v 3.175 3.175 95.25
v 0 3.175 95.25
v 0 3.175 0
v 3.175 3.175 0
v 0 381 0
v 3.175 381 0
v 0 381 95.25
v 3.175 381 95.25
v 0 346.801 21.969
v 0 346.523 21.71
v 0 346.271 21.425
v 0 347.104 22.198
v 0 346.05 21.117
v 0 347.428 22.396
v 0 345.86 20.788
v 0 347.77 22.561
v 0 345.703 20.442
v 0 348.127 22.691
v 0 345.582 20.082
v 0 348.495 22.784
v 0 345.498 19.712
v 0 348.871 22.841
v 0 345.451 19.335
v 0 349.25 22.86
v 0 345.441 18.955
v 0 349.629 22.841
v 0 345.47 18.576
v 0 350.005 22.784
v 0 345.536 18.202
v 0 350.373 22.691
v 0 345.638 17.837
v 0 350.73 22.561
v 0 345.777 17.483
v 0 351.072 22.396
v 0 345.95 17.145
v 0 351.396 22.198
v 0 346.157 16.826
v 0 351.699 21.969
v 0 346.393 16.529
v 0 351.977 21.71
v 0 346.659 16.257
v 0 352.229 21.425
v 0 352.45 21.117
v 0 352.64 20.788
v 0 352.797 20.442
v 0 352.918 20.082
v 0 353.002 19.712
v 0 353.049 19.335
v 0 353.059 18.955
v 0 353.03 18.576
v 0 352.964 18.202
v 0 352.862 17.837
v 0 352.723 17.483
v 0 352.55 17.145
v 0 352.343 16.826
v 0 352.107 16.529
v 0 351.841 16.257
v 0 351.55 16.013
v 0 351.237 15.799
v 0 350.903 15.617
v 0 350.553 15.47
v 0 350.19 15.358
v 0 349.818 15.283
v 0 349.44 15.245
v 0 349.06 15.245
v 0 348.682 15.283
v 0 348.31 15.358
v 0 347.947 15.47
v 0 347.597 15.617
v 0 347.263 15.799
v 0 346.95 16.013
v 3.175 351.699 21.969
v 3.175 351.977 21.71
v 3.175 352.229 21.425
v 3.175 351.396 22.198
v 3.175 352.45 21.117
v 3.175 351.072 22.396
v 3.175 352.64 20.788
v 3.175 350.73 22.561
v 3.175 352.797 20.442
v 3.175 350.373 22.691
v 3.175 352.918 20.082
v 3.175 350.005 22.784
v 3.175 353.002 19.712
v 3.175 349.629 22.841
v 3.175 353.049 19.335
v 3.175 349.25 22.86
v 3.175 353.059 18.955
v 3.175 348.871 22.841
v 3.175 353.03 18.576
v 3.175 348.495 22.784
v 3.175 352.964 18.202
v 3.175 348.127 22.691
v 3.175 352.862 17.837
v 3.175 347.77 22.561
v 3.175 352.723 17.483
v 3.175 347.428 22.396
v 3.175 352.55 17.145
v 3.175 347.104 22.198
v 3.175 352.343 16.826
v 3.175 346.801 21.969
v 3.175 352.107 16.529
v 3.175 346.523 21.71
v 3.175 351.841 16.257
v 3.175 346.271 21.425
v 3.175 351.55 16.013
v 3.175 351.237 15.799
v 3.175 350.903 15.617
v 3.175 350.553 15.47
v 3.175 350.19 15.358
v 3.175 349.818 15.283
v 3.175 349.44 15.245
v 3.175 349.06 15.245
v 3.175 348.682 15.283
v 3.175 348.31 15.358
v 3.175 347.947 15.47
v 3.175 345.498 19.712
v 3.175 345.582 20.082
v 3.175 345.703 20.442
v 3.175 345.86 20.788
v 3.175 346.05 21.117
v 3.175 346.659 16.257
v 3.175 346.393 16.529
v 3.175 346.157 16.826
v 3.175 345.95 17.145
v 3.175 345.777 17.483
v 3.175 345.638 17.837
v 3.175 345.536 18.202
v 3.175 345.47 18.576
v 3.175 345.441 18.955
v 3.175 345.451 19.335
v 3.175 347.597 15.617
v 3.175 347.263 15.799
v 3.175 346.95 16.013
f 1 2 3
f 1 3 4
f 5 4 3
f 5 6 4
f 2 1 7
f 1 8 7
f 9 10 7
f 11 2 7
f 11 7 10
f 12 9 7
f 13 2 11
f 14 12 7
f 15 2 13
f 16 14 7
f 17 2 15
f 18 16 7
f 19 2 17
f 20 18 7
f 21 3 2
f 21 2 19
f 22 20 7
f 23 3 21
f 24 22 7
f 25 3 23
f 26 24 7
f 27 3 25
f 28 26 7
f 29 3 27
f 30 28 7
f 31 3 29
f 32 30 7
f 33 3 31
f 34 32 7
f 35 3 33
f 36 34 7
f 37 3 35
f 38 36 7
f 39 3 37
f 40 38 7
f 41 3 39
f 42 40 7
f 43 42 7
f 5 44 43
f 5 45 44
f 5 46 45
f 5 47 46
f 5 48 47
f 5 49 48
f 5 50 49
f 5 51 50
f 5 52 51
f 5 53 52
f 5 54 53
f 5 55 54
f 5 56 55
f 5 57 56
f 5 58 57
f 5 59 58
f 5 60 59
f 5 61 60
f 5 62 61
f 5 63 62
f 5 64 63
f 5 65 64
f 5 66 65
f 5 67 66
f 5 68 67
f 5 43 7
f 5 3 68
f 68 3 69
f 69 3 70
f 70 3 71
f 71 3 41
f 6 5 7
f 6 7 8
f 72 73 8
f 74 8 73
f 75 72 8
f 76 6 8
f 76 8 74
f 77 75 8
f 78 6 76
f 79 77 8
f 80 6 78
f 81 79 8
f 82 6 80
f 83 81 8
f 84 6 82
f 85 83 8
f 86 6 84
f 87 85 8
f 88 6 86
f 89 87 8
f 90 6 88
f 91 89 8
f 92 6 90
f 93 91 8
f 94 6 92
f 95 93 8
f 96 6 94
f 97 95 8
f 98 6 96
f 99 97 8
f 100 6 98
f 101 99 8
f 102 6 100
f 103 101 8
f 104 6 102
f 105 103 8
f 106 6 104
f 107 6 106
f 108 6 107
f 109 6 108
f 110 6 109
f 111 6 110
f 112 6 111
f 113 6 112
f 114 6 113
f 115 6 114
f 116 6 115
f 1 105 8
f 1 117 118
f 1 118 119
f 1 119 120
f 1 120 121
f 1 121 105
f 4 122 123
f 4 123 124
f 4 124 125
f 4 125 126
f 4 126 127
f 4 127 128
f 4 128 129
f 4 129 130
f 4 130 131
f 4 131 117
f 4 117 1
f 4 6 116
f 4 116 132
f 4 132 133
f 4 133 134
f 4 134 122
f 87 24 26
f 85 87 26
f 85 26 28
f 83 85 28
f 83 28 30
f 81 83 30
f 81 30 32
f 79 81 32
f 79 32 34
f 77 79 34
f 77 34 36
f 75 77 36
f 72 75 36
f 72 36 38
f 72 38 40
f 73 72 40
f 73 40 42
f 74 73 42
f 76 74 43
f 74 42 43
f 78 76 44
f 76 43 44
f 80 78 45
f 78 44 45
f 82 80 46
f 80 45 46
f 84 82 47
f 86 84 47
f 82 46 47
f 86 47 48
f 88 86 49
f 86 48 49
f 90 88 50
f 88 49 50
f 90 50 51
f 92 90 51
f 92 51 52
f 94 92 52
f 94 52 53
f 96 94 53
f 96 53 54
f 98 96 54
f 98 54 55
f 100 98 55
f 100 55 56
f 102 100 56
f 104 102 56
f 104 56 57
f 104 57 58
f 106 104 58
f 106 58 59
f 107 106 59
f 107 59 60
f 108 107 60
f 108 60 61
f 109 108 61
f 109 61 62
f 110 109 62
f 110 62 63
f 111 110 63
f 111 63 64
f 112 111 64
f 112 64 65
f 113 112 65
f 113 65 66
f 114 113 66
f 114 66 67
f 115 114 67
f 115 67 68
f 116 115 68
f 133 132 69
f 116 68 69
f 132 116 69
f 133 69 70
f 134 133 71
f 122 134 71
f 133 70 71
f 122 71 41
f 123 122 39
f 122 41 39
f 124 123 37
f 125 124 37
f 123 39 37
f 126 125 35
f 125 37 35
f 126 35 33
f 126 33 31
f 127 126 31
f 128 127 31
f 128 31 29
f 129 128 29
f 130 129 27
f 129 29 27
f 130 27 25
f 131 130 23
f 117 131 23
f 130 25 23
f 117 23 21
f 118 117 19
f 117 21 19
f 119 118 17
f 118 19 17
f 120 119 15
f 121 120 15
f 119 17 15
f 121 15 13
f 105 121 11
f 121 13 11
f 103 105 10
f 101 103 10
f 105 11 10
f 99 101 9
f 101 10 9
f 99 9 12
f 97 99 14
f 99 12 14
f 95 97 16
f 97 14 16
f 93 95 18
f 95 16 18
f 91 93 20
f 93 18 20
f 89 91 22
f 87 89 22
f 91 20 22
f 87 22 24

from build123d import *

# Parameters (mm, degrees)
BOSS_EXTRUDE1_DEPTH = 95.25
SKETCH2_R           = 3.175
CUT_EXTRUDE1_DEPTH  = 152.4
SKETCH4_R           = 34.925
SKETCH4_R_2         = 3.81
CUT_EXTRUDE2_DEPTH  = 381
SKETCH5_R           = 3.81
CUT_EXTRUDE3_DEPTH  = 12.7
SKETCH6_W           = 473.075
SKETCH6_H           = 95.25
CUT_EXTRUDE4_DEPTH  = 3.175


with BuildPart() as part:
    # Sketch1 → Boss-Extrude1 (new body)
    with BuildSketch(Plane.XY):
        Polygon((0, 0), (0, 381), (3.175, 381), (3.175, 3.175), (473.075, 3.175), (473.075, 0), align=None)
    extrude(amount=BOSS_EXTRUDE1_DEPTH)

    # Sketch2 → Cut-Extrude1 (cut)
    with BuildSketch(Plane(origin=(0, 3.175, 0), x_dir=(1, 0, 0), z_dir=(0, 1, 0))):
        with Locations(Location((190.119, -4.572, 0), (0, 0, 180))):
            Circle(SKETCH2_R)
        with Locations(Location((190.119, -76.2, 0), (0, 0, 180))):
            Circle(SKETCH2_R)
        with Locations(Location((261.747, -4.572, 0), (0, 0, 180))):
            Circle(SKETCH2_R)
        with Locations(Location((261.747, -76.2, 0), (0, 0, 180))):
            Circle(SKETCH2_R)
        with Locations(Location((295.783, -76.2, 0), (0, 0, 180))):
            Circle(SKETCH2_R)
        with Locations(Location((295.783, -4.572, 0), (0, 0, 180))):
            Circle(SKETCH2_R)
        with Locations(Location((367.411, -76.2, 0), (0, 0, 180))):
            Circle(SKETCH2_R)
        with Locations(Location((367.411, -4.572, 0), (0, 0, 180))):
            Circle(SKETCH2_R)
    extrude(amount=-CUT_EXTRUDE1_DEPTH, mode=Mode.SUBTRACT)

    # Sketch4 → Cut-Extrude2 (cut)
    with BuildSketch(Plane.XZ):
        with Locations((225.933, 40.386)):
            Circle(SKETCH4_R)
        with Locations((331.597, 40.386)):
            Circle(SKETCH4_R)
        with Locations((390.525, 19.05)):
            Circle(SKETCH4_R_2)
    extrude(amount=-CUT_EXTRUDE2_DEPTH, mode=Mode.SUBTRACT)

    # Sketch5 → Cut-Extrude3 (cut)
    with BuildSketch(Plane.ZY):
        with Locations((19.05, 349.25)):
            Circle(SKETCH5_R)
    extrude(amount=-CUT_EXTRUDE3_DEPTH, mode=Mode.SUBTRACT)

    # Sketch6 → Cut-Extrude4 (cut)
    with BuildSketch(Plane.XZ):
        with Locations((236.5375, 47.625)):
            Rectangle(SKETCH6_W, SKETCH6_H)
    extrude(amount=-CUT_EXTRUDE4_DEPTH, mode=Mode.SUBTRACT)


solid = part.part
